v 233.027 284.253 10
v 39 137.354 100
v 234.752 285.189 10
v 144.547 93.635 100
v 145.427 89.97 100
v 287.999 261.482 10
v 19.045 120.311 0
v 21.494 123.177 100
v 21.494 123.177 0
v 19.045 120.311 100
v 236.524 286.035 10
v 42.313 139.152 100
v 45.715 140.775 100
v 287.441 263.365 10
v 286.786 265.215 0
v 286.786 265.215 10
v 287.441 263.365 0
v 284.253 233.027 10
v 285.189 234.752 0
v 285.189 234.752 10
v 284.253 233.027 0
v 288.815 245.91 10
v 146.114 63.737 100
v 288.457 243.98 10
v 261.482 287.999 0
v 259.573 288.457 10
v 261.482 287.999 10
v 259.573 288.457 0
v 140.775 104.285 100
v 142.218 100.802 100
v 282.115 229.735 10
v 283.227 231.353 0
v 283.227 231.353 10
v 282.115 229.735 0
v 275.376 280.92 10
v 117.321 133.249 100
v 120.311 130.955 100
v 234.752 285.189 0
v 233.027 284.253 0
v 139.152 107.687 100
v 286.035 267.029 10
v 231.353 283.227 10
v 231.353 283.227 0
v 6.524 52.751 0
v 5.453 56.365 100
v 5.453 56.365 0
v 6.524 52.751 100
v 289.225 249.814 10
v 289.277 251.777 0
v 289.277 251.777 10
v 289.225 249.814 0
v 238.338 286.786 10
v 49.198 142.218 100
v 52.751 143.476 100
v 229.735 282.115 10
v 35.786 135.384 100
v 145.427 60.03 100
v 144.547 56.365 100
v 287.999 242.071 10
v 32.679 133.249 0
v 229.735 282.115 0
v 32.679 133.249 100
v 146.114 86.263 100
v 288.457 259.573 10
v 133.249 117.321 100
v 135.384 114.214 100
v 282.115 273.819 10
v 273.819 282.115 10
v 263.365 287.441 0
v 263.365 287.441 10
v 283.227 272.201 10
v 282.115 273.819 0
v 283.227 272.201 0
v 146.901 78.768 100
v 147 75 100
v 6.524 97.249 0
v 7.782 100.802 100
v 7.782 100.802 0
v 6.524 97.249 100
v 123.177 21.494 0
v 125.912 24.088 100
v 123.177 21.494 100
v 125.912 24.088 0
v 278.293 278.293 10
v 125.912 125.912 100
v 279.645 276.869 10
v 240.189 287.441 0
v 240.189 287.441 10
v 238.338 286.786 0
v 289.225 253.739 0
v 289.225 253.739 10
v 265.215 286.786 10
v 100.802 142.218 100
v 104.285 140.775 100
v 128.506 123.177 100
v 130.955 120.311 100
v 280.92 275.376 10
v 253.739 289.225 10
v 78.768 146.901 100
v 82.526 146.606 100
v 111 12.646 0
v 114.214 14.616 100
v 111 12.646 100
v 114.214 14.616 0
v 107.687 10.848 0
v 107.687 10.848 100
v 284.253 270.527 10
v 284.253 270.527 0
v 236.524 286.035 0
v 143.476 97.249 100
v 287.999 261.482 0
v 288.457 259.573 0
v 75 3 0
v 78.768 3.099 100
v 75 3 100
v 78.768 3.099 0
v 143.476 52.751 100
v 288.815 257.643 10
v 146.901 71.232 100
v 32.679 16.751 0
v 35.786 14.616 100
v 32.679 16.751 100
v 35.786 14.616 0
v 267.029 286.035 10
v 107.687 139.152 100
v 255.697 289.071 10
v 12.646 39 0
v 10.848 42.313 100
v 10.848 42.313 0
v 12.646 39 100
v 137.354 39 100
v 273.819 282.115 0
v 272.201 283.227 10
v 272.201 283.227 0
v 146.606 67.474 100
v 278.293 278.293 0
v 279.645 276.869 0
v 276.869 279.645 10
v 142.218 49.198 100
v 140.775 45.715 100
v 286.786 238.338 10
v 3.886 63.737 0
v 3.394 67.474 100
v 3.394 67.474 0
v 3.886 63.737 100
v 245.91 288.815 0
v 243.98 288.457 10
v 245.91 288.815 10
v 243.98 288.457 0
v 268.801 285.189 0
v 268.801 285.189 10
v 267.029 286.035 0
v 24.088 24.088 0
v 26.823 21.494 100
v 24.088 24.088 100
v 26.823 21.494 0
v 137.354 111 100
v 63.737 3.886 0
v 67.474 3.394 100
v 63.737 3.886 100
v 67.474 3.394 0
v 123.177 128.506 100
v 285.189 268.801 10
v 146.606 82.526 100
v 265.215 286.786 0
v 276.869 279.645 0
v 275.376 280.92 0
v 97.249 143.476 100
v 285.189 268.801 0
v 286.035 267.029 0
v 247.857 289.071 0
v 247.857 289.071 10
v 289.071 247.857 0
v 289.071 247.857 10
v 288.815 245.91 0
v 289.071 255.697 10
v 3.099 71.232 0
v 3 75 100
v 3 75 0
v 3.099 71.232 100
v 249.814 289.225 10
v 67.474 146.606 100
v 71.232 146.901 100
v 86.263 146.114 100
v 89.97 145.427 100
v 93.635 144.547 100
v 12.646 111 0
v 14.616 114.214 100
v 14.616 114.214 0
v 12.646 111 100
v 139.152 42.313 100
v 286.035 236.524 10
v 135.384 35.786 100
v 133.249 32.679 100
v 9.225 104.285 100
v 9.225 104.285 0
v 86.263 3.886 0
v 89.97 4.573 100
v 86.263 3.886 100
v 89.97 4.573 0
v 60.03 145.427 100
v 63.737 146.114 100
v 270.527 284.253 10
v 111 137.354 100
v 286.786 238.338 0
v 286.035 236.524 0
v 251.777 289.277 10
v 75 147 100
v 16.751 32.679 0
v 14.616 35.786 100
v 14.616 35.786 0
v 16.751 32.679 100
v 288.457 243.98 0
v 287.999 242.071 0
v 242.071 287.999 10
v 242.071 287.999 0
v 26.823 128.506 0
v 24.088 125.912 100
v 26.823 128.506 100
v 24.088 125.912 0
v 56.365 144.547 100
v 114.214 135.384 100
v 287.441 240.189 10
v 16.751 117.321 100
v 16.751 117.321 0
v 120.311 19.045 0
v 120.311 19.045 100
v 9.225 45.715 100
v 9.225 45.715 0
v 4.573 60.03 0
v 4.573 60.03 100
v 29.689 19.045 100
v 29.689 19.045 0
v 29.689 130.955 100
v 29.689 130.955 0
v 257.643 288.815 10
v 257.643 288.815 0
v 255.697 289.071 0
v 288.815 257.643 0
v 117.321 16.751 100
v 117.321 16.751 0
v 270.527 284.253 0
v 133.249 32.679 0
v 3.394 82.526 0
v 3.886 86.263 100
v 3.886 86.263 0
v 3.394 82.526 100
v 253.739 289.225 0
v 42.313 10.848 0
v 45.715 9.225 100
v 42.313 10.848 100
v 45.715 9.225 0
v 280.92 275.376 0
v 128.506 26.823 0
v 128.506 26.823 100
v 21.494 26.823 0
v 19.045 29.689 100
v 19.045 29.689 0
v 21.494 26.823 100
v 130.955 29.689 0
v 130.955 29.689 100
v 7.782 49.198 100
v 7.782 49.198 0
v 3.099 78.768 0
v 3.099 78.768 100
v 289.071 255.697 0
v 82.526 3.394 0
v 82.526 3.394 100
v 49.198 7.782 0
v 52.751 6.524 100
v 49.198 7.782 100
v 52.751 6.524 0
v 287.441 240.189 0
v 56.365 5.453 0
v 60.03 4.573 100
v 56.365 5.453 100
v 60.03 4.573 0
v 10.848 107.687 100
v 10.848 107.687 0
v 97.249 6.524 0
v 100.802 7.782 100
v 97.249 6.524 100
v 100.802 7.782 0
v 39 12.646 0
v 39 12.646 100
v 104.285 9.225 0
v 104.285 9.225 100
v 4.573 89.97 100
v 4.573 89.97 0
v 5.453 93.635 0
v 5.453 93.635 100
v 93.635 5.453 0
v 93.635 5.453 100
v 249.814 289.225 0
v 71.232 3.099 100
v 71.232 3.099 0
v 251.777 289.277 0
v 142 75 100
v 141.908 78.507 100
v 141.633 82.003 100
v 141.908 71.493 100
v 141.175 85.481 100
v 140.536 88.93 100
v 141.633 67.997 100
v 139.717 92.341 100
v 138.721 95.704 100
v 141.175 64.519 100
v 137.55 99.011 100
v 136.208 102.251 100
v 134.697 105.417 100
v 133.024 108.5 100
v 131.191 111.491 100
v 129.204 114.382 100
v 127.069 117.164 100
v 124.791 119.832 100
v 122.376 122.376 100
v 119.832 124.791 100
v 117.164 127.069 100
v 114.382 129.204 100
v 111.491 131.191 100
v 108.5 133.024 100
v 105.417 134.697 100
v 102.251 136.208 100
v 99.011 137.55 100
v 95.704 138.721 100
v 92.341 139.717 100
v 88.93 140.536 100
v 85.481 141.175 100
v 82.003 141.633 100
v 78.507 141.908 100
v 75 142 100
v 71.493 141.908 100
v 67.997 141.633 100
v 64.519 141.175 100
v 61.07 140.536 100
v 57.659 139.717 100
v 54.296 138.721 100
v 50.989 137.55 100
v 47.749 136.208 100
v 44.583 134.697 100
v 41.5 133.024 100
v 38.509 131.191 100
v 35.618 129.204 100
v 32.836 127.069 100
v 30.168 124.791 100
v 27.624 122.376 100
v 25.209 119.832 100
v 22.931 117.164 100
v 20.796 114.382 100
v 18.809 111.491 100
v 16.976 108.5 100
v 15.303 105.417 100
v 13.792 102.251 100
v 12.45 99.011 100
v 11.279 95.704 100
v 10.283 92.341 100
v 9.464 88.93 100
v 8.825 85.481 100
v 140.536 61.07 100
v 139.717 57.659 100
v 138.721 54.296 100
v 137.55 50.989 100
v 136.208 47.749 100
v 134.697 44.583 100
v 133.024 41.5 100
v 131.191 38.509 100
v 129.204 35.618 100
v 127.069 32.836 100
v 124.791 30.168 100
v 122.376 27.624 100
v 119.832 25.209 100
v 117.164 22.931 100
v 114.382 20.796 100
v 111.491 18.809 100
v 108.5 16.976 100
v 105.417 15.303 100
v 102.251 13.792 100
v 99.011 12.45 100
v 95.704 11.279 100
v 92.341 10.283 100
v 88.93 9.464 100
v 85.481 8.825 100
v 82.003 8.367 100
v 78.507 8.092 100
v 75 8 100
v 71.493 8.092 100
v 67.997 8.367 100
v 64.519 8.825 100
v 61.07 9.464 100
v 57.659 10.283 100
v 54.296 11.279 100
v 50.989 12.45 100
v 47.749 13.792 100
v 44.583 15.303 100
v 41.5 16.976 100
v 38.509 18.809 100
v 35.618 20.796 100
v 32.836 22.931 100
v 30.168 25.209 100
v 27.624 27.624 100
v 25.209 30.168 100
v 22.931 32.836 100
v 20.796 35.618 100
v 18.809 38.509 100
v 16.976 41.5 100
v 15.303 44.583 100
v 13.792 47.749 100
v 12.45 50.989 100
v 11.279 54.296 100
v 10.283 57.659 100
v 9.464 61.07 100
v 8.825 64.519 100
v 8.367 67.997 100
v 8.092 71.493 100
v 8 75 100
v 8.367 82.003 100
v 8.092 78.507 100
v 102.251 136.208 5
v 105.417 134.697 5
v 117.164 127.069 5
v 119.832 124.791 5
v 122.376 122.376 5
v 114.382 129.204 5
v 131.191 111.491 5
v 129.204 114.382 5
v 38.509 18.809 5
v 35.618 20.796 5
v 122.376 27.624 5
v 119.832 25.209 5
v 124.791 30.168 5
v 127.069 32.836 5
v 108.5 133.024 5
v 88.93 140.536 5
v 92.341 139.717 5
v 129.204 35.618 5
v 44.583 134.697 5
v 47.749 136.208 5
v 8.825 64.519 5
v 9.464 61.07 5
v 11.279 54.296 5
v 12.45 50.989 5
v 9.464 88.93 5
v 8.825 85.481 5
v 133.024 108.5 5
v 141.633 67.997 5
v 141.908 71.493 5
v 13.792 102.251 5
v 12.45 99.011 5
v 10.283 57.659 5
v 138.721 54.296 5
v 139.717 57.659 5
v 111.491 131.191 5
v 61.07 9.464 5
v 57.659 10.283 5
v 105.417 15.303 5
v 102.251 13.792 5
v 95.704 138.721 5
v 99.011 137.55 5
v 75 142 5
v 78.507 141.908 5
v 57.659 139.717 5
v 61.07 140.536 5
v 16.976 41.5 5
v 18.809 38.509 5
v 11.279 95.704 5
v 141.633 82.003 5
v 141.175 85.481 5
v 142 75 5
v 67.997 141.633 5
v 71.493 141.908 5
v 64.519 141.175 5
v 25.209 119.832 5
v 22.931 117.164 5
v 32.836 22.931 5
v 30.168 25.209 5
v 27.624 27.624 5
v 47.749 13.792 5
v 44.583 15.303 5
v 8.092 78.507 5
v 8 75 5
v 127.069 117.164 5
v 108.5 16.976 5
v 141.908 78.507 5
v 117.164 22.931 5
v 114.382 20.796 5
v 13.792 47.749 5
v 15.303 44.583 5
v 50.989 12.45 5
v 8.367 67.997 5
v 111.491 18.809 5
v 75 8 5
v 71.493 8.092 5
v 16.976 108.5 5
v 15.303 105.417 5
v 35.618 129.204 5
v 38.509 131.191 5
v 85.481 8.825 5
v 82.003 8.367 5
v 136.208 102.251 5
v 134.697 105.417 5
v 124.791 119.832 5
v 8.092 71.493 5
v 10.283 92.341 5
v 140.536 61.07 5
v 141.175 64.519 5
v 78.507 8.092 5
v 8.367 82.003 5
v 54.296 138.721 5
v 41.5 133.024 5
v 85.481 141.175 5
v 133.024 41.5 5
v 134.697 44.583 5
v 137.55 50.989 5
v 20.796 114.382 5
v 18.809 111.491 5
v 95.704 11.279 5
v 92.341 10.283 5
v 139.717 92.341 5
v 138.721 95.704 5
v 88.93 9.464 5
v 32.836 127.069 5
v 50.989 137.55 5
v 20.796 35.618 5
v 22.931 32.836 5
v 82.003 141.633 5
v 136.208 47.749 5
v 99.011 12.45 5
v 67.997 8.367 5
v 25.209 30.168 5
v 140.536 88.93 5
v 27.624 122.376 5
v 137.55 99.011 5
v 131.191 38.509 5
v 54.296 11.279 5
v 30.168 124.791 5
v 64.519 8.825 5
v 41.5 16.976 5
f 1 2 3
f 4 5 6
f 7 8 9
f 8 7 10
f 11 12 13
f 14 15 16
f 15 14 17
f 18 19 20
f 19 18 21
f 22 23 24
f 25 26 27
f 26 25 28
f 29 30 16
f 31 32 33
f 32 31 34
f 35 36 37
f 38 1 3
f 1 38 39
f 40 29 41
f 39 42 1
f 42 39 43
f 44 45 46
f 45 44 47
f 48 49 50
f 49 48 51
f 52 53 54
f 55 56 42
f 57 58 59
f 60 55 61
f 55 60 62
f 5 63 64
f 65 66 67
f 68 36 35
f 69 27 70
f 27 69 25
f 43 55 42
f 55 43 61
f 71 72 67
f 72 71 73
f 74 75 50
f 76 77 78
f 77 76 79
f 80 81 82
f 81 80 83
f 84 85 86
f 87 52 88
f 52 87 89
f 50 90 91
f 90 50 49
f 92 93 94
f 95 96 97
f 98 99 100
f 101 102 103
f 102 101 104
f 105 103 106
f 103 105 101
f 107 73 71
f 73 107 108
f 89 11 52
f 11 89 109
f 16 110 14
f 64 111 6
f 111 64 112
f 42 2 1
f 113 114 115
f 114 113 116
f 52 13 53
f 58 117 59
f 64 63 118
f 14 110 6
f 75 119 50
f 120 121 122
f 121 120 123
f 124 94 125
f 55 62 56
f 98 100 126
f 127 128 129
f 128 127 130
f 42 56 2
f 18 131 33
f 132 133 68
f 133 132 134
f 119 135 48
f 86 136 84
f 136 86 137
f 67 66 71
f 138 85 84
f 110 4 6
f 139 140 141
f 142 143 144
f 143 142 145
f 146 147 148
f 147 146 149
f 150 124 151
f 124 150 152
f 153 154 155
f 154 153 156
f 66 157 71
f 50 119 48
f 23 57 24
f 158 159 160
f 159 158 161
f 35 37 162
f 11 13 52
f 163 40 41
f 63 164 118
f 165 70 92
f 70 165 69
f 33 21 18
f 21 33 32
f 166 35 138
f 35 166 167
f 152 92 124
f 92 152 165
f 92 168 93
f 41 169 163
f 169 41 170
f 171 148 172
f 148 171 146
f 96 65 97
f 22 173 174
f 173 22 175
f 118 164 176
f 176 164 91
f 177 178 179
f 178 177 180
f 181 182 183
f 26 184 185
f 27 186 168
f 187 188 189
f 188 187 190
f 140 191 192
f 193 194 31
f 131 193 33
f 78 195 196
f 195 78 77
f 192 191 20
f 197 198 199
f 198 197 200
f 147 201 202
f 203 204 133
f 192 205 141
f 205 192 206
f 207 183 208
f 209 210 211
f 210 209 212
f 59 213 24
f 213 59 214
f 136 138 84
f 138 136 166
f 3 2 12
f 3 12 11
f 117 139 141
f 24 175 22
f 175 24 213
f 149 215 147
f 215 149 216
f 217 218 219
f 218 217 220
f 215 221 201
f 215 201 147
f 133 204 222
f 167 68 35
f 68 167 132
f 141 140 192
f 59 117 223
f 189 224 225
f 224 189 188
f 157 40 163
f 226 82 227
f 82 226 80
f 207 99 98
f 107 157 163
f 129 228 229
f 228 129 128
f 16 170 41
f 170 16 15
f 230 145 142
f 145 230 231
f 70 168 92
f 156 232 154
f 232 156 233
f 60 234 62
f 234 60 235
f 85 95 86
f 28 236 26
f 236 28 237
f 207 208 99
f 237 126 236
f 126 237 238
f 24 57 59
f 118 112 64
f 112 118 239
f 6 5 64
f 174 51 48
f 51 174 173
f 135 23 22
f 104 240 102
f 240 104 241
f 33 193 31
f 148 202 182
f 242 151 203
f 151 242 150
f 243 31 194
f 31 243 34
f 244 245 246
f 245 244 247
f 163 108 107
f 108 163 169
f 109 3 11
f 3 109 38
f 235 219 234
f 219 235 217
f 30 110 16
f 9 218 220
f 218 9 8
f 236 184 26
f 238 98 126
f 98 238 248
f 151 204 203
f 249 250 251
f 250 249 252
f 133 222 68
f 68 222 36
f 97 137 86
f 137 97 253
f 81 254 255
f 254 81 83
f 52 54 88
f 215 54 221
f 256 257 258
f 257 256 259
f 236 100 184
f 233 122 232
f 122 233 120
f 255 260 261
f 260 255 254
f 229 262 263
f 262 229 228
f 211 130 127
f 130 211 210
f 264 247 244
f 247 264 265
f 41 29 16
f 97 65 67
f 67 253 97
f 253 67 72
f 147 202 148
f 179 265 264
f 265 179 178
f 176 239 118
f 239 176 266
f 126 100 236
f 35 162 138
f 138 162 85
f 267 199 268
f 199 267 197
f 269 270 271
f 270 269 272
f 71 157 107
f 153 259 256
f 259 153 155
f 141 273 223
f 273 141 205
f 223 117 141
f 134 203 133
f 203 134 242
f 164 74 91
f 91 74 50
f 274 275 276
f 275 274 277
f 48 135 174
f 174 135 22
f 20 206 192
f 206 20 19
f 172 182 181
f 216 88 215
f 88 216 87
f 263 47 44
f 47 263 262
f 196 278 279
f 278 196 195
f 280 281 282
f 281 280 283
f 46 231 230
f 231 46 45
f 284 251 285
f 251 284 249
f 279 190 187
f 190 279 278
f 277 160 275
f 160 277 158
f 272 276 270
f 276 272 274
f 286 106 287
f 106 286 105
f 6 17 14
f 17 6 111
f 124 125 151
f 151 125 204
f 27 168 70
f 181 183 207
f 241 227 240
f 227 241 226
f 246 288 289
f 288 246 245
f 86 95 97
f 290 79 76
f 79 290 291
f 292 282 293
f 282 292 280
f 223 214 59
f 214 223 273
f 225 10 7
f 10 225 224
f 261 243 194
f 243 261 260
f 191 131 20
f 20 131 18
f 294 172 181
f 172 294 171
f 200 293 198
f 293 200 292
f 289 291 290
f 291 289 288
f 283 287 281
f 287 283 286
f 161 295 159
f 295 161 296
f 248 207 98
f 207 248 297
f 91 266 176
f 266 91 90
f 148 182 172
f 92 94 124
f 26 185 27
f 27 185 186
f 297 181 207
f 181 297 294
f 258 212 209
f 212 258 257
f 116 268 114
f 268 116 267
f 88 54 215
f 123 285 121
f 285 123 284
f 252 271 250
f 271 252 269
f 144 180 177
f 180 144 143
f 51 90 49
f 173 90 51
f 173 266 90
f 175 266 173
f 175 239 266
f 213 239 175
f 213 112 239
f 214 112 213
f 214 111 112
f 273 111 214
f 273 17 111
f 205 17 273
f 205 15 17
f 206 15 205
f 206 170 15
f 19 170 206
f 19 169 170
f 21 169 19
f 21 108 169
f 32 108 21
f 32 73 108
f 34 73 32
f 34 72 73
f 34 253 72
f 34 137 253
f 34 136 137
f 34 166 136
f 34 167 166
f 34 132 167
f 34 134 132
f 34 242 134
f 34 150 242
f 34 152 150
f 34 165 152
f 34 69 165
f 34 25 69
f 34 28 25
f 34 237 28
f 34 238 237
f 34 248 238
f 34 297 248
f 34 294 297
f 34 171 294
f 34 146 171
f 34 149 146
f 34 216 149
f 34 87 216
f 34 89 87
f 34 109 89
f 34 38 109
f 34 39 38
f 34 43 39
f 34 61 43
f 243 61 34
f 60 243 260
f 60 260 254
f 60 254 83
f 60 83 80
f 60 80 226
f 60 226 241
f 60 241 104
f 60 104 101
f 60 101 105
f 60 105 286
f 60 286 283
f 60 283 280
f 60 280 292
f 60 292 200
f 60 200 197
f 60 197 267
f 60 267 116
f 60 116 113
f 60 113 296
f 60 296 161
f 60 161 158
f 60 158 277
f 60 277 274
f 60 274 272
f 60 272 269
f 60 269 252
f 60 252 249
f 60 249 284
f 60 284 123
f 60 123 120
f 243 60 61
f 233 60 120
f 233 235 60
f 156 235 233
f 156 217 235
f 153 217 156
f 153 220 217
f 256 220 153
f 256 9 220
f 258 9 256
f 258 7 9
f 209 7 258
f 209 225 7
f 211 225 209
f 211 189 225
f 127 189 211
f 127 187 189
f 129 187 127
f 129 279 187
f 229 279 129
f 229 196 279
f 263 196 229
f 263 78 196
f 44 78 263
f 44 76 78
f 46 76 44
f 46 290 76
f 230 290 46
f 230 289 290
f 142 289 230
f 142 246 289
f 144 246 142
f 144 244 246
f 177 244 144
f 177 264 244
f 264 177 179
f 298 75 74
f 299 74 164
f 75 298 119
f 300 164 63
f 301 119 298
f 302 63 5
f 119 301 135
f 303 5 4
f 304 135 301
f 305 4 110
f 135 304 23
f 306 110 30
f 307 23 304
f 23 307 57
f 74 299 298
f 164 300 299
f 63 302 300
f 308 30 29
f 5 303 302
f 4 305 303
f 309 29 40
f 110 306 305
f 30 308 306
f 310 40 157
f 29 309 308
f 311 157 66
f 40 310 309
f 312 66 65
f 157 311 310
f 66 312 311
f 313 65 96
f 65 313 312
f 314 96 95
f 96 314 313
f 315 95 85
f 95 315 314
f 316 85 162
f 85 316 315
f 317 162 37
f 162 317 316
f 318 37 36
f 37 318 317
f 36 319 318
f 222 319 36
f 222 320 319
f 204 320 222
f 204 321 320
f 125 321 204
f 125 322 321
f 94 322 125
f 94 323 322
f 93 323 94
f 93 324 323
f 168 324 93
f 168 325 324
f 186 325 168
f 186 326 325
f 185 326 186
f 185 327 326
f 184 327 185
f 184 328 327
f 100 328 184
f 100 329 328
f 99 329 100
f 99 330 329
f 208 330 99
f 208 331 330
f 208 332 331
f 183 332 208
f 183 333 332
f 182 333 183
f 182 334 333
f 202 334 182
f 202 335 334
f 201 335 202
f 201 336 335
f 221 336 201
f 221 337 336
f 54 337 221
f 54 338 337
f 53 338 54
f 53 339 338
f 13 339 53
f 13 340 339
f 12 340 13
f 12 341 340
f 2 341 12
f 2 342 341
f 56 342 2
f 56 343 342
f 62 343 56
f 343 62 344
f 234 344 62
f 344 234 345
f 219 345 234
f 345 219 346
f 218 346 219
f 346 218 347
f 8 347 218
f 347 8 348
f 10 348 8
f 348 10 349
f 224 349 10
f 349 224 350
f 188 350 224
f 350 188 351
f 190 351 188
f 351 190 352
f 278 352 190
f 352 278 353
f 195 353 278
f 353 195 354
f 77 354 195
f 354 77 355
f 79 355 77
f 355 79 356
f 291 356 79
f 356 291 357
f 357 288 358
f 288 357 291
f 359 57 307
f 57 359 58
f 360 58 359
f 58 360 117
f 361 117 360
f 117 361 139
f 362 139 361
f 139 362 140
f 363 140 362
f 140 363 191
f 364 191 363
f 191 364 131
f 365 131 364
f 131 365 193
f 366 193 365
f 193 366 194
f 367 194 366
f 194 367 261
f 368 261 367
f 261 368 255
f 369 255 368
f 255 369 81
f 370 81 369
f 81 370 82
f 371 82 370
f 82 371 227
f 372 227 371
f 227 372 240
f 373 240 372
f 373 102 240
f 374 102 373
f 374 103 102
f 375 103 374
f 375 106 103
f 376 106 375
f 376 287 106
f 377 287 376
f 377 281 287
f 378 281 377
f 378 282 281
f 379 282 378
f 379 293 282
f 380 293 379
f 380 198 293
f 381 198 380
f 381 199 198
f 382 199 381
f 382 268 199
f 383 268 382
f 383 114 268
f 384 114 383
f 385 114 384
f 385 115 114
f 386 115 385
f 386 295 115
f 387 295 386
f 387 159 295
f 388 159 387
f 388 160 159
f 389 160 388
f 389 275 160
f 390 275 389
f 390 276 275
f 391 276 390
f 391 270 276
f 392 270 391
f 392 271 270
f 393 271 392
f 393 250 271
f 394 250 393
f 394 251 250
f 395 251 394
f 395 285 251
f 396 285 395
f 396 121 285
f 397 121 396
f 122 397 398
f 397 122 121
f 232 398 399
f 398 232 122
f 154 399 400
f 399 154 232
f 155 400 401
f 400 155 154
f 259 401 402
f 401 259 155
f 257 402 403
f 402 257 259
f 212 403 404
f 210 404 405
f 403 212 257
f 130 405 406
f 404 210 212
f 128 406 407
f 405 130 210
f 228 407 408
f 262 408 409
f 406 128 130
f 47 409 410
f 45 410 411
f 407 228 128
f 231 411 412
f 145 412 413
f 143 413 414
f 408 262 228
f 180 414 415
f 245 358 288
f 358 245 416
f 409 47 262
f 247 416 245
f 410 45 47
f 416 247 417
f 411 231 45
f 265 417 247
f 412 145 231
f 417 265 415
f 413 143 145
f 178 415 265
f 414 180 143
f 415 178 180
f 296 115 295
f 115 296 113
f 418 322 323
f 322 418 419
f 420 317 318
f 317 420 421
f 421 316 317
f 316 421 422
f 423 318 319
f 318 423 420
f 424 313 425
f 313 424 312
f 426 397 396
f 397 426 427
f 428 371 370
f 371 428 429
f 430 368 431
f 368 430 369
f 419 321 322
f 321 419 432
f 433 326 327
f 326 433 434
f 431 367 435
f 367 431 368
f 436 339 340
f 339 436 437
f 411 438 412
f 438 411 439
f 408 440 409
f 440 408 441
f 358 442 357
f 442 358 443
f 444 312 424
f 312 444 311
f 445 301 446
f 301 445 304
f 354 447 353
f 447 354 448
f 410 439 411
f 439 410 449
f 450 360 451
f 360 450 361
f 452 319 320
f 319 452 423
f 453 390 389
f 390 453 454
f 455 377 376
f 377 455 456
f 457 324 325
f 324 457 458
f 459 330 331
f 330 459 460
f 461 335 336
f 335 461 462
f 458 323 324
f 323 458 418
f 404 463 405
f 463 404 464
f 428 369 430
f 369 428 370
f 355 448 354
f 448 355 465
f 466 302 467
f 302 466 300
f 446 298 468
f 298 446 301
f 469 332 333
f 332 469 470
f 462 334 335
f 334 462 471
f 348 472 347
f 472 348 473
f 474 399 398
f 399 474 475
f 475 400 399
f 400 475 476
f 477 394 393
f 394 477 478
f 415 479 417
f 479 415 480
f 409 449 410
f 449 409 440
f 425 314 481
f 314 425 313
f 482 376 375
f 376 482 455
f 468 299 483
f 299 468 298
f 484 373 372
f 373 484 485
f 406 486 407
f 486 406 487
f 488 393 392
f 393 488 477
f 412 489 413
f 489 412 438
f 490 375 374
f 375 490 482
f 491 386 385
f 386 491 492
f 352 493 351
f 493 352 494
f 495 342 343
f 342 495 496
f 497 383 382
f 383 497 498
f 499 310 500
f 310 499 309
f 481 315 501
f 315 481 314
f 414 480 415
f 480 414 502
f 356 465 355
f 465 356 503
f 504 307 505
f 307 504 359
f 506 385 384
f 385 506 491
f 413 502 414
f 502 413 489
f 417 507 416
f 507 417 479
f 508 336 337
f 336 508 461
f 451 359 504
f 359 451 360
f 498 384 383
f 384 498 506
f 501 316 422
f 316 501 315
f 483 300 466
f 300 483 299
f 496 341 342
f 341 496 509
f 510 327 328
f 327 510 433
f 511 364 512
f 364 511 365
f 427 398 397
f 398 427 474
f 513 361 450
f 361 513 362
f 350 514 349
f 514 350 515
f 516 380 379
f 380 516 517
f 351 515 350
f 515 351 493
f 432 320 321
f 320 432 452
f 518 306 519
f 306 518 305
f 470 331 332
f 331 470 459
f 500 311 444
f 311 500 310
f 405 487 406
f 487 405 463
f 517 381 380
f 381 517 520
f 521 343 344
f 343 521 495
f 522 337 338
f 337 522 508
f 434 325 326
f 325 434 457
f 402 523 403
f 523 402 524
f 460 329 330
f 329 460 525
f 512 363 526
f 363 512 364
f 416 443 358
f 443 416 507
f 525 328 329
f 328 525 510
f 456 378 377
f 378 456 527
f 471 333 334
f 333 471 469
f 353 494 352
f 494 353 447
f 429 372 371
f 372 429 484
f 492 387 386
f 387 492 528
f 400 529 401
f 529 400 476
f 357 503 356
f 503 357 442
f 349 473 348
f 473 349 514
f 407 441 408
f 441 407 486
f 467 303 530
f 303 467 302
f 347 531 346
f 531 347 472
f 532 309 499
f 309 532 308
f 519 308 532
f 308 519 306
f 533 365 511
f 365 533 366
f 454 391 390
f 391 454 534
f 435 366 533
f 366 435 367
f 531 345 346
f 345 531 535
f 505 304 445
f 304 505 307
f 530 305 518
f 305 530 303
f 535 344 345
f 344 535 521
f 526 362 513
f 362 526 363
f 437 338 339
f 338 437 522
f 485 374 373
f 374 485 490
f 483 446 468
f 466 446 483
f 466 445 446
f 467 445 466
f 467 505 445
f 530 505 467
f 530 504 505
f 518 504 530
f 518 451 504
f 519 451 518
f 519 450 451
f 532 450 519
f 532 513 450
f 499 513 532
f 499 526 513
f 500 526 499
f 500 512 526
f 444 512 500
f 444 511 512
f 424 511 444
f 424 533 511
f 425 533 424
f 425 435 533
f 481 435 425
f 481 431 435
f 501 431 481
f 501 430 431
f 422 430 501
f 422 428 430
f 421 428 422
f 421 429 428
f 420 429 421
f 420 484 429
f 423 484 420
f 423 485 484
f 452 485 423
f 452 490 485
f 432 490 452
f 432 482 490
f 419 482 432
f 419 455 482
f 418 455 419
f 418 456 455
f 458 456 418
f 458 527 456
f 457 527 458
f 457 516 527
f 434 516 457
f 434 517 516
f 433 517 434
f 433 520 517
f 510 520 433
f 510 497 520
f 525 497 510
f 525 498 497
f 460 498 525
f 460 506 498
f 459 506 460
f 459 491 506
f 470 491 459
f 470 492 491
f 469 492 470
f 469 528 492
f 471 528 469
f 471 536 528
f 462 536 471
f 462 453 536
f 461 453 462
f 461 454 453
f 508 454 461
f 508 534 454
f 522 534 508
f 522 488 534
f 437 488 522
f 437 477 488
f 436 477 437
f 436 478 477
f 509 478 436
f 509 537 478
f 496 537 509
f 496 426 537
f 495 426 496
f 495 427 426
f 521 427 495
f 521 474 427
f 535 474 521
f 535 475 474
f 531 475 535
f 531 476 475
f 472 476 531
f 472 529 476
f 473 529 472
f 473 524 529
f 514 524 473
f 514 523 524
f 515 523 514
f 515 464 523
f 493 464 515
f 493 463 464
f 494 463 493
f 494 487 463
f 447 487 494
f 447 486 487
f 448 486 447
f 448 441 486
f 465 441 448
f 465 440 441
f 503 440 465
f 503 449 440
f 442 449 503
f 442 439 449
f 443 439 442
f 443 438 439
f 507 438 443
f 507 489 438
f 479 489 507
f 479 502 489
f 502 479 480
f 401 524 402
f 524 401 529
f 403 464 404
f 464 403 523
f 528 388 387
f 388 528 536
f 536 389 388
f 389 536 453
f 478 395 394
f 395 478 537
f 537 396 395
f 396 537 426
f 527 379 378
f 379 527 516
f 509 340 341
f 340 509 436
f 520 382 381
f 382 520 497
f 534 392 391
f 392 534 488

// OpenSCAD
$fn=120;

tank_dia=134;
height=100;
width=300;

translate([75,75,0]) rotate([0,0,45]) tank_stand();
//%cube([250,250,10]);
%cube([300,300,10]);

module tank_stand(){
  difference(){
    hull(){
      cylinder(d=134+10, h=height);
      translate([width-50,0,0]) cylinder(d=75, h=10);
    }
    translate([0,0,5]) cylinder(d=134, h=height);
  }
}
